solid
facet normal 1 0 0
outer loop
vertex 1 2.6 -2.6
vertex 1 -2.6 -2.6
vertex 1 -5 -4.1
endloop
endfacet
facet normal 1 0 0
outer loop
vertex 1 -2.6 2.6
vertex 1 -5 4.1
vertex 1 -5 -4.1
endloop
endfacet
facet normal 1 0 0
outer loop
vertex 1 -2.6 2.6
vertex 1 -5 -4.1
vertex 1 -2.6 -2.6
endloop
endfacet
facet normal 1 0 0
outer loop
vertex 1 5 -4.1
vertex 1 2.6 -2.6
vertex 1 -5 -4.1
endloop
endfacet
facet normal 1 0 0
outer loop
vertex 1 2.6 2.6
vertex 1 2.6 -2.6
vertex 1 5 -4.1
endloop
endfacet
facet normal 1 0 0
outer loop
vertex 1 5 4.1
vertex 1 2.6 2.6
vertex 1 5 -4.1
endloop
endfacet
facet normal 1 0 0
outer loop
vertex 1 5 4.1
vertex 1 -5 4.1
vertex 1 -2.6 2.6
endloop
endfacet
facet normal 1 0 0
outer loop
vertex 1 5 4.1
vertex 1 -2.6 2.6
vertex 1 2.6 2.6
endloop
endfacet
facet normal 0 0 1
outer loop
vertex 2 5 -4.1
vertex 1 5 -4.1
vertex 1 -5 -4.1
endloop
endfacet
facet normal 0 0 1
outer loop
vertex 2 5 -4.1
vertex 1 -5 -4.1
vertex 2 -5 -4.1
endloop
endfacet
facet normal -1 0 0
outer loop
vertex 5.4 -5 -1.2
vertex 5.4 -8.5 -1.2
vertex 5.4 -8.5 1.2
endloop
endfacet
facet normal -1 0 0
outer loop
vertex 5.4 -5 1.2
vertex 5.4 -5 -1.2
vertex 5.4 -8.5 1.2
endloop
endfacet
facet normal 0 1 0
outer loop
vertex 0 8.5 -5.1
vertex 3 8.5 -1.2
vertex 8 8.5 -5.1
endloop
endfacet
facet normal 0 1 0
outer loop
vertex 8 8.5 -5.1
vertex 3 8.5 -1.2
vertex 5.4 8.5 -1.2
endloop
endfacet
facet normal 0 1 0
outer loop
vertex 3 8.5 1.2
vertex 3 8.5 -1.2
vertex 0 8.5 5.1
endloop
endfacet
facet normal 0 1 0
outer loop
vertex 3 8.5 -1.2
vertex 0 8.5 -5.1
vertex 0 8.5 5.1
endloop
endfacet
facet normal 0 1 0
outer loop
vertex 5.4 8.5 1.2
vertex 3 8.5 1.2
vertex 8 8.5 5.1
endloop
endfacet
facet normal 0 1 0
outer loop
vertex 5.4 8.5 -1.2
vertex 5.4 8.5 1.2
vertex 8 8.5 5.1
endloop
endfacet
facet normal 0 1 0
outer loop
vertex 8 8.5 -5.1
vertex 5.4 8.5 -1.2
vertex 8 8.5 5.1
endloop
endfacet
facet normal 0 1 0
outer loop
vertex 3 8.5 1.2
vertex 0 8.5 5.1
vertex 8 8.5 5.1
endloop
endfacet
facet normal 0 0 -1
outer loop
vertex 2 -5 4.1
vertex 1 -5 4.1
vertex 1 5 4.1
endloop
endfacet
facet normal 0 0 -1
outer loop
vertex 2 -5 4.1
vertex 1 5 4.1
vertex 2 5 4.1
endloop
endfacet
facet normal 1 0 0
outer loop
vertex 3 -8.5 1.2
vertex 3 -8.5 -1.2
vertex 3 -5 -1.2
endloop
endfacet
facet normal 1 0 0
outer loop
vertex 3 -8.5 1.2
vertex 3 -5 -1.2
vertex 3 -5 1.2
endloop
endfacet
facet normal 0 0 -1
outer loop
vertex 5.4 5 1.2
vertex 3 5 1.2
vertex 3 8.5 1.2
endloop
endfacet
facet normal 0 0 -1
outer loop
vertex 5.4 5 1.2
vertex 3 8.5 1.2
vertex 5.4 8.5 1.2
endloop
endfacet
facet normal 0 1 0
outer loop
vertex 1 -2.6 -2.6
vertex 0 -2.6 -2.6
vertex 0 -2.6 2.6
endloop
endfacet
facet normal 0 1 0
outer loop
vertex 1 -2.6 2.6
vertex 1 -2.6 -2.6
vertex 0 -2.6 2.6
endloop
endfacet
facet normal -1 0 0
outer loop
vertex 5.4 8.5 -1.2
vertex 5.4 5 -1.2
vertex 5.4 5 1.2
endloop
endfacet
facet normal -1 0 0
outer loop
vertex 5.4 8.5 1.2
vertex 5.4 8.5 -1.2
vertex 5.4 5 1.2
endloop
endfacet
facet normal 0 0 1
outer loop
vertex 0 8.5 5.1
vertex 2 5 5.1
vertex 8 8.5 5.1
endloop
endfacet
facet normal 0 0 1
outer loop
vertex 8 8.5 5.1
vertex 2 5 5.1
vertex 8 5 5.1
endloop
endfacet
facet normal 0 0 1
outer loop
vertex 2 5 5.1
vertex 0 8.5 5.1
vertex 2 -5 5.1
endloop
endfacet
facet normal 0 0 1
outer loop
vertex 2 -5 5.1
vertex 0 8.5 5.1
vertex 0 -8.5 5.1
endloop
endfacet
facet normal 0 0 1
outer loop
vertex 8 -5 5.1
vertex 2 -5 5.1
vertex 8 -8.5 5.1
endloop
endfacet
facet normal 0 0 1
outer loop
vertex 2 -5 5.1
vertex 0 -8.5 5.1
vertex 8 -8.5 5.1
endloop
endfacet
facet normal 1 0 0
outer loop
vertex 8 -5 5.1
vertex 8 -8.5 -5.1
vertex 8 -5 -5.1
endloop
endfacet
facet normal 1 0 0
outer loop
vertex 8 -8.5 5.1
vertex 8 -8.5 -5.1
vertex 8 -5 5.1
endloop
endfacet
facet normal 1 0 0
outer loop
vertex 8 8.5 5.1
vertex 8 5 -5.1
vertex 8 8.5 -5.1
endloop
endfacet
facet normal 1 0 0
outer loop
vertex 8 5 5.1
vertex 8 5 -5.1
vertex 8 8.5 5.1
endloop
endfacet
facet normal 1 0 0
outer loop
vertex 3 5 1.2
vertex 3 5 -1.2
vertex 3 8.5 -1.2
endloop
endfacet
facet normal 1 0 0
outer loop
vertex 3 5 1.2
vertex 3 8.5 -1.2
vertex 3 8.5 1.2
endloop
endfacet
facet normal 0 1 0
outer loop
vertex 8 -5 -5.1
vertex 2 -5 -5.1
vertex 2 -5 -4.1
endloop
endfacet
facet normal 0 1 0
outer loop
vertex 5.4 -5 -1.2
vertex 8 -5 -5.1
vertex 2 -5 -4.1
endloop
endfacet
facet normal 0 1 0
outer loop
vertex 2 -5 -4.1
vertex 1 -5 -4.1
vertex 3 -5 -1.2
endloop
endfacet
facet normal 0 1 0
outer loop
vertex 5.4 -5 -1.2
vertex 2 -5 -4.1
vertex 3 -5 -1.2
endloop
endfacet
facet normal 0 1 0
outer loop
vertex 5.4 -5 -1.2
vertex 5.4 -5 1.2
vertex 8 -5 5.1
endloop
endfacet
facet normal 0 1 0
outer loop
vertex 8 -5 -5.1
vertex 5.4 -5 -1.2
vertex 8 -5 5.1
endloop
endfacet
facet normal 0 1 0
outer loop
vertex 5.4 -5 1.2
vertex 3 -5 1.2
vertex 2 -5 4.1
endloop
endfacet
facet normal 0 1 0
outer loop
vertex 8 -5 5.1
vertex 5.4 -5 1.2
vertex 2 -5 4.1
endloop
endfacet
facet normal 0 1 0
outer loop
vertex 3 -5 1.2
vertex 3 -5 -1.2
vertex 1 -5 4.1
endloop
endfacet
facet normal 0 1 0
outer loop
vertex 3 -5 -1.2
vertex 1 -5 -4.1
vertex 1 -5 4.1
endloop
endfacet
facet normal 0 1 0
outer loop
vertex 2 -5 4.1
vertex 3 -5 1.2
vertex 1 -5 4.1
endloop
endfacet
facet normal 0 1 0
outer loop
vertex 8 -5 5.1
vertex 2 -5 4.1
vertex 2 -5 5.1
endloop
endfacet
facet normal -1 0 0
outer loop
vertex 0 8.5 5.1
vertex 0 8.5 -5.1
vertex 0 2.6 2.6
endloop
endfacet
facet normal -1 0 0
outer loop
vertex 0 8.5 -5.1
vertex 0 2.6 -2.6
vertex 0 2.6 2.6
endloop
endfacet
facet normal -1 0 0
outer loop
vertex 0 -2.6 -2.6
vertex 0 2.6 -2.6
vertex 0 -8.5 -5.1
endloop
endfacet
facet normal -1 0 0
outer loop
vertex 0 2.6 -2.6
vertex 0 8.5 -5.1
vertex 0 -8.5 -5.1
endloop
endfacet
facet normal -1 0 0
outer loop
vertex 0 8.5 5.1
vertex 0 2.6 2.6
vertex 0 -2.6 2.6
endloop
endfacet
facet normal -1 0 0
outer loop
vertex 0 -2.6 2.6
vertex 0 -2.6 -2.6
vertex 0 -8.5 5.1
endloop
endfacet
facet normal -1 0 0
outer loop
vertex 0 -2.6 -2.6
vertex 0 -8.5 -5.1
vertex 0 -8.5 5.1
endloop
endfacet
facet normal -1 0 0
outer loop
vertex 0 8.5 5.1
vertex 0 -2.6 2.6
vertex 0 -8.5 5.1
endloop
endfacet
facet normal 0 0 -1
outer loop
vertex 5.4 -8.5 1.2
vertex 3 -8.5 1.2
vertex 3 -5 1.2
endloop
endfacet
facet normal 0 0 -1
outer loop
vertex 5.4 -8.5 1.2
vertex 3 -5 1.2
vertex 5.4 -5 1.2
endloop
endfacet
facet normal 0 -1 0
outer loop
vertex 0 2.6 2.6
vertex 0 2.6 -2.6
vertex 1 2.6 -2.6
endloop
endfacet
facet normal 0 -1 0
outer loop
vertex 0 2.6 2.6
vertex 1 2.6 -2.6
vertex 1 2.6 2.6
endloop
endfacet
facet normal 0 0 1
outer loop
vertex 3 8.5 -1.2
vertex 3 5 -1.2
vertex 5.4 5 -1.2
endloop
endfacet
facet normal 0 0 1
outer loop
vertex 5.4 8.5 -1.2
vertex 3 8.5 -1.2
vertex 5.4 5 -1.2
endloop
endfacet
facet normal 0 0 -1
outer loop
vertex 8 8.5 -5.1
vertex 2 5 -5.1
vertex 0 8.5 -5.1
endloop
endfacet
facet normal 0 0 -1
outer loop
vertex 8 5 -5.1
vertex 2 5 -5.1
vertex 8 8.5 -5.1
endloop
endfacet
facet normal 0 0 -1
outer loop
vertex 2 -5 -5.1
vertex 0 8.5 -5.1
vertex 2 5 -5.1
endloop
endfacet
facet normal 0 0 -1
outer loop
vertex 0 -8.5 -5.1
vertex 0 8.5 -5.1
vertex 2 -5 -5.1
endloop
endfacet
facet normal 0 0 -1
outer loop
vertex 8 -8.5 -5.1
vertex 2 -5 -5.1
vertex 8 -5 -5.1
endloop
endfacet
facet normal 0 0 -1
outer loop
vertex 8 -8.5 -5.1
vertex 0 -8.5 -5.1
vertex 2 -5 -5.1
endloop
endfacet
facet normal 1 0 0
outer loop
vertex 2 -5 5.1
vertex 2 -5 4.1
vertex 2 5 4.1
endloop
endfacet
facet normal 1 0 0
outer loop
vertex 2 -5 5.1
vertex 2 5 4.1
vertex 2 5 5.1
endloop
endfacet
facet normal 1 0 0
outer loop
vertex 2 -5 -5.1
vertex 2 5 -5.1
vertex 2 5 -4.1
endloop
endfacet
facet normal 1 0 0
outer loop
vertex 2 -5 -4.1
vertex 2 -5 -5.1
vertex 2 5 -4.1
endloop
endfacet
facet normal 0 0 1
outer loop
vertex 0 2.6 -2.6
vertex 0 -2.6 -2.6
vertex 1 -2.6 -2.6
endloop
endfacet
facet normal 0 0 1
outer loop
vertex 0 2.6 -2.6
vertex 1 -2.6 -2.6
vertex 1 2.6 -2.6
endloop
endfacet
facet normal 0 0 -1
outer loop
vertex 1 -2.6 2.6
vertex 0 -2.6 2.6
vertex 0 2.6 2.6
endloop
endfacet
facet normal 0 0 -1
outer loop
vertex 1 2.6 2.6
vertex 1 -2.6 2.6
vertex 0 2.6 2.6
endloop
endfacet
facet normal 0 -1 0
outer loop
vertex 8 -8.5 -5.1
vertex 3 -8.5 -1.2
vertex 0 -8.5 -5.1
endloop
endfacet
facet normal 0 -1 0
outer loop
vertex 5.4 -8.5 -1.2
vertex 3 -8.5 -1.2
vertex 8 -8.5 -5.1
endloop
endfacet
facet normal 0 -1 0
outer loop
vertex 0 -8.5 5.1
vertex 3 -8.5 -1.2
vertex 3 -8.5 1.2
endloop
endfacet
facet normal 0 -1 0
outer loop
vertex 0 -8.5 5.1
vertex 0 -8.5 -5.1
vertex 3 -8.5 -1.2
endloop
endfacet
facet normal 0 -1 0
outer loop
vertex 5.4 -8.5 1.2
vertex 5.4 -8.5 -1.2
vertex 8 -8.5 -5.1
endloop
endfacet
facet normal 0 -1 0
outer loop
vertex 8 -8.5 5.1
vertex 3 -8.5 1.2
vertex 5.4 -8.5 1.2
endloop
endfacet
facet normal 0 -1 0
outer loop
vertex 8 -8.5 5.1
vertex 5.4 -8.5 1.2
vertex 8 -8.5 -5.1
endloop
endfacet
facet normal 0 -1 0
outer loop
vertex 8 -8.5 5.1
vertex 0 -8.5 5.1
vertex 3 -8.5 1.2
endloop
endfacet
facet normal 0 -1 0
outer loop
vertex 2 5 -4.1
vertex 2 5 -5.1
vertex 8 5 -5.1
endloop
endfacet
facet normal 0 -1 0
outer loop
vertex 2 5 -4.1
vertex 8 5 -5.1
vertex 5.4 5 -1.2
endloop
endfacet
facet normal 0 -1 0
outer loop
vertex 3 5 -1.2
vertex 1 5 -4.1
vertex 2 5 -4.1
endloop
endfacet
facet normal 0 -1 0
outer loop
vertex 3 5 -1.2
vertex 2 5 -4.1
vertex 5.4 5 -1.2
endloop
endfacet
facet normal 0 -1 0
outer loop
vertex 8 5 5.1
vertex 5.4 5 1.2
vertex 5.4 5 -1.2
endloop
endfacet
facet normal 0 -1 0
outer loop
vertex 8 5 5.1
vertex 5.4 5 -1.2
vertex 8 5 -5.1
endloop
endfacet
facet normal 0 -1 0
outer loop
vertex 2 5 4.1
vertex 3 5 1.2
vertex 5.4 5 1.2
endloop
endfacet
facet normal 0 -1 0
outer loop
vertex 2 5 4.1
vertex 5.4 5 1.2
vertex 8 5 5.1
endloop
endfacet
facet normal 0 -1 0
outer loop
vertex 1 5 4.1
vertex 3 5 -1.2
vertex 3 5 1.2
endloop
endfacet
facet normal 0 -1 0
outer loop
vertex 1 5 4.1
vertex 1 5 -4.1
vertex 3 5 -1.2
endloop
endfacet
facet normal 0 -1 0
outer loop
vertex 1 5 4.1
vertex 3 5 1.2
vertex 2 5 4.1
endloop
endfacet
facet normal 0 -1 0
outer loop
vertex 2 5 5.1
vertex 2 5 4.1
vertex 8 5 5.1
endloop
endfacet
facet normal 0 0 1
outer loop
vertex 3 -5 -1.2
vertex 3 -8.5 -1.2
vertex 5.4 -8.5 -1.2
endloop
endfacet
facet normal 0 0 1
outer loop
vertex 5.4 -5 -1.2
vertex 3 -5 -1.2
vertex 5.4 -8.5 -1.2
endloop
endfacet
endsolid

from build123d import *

# Parameters (mm, degrees)
SKETCH049_W      = 1
SKETCH049_H      = 1
EXTRUDE052_DEPTH = 8.5
SKETCH048_W      = 2.4
SKETCH048_H      = 2.4
EXTRUDE051_DEPTH = 8.5
SKETCH046_W      = 5.2
SKETCH046_H      = 5.2
EXTRUDE049_DEPTH = 1
SKETCH047_W      = 10
SKETCH047_H      = 10.2
EXTRUDE050_DEPTH = 8
SKETCH045_W      = 8
SKETCH045_H      = 10.2
EXTRUDE048_DEPTH = 8.5


with BuildPart() as extrude052:
    # Sketch049 → Extrude052 (new body, symmetric)
    with BuildSketch(Plane.XZ):
        with Locations((1.5, -4.6)):
            Rectangle(SKETCH049_W, SKETCH049_H)
        with Locations((1.5, 4.6)):
            Rectangle(SKETCH049_W, SKETCH049_H)
    extrude(amount=EXTRUDE052_DEPTH, both=True)


with BuildPart() as extrude_buco_per_perno_blocco_neopixel:
    # Sketch048 → Extrude051 (new body, symmetric)
    with BuildSketch(Plane.XZ):
        with Locations((4.2, 0)):
            Rectangle(SKETCH048_W, SKETCH048_H)
    extrude(amount=EXTRUDE051_DEPTH, both=True)


with BuildPart() as extrude_scavo_5x5_neopixel:
    # Sketch046 → Extrude049 (new body)
    with BuildSketch(Plane.YZ):
        Rectangle(SKETCH046_W, SKETCH046_H)
    extrude(amount=EXTRUDE049_DEPTH)


with BuildPart() as extrude_scavo_10x10_neopixel_corpo:
    # Sketch047 → Extrude050 (new body)
    with BuildSketch(Plane.YZ):
        Rectangle(SKETCH047_W, SKETCH047_H)
    extrude(amount=EXTRUDE050_DEPTH)


with BuildPart() as extrude_scavo_10x10_neopixel_corpo_1:
    # Extrude050 placement: moved
    add(extrude_scavo_10x10_neopixel_corpo.part.moved(Location((1, 0, 0))))


with BuildPart() as fusion_neopixel:
    # Sketch045 → Extrude048 (new body, symmetric)
    with BuildSketch(Plane.XZ):
        with Locations((4, 0)):
            Rectangle(SKETCH045_W, SKETCH045_H)
    extrude(amount=EXTRUDE048_DEPTH, both=True)

    # Cut030: cut Extrude scavo 10x10 neopixel corpo
    add(extrude_scavo_10x10_neopixel_corpo_1.part, mode=Mode.SUBTRACT)

    # Cut031: cut Extrude scavo 5x5 neopixel
    add(extrude_scavo_5x5_neopixel.part, mode=Mode.SUBTRACT)

    # Cut032: cut Extrude buco per perno blocco neopixel
    add(extrude_buco_per_perno_blocco_neopixel.part, mode=Mode.SUBTRACT)

    # Fusion001: union Extrude052
    add(extrude052.part)


solid = fusion_neopixel.part
